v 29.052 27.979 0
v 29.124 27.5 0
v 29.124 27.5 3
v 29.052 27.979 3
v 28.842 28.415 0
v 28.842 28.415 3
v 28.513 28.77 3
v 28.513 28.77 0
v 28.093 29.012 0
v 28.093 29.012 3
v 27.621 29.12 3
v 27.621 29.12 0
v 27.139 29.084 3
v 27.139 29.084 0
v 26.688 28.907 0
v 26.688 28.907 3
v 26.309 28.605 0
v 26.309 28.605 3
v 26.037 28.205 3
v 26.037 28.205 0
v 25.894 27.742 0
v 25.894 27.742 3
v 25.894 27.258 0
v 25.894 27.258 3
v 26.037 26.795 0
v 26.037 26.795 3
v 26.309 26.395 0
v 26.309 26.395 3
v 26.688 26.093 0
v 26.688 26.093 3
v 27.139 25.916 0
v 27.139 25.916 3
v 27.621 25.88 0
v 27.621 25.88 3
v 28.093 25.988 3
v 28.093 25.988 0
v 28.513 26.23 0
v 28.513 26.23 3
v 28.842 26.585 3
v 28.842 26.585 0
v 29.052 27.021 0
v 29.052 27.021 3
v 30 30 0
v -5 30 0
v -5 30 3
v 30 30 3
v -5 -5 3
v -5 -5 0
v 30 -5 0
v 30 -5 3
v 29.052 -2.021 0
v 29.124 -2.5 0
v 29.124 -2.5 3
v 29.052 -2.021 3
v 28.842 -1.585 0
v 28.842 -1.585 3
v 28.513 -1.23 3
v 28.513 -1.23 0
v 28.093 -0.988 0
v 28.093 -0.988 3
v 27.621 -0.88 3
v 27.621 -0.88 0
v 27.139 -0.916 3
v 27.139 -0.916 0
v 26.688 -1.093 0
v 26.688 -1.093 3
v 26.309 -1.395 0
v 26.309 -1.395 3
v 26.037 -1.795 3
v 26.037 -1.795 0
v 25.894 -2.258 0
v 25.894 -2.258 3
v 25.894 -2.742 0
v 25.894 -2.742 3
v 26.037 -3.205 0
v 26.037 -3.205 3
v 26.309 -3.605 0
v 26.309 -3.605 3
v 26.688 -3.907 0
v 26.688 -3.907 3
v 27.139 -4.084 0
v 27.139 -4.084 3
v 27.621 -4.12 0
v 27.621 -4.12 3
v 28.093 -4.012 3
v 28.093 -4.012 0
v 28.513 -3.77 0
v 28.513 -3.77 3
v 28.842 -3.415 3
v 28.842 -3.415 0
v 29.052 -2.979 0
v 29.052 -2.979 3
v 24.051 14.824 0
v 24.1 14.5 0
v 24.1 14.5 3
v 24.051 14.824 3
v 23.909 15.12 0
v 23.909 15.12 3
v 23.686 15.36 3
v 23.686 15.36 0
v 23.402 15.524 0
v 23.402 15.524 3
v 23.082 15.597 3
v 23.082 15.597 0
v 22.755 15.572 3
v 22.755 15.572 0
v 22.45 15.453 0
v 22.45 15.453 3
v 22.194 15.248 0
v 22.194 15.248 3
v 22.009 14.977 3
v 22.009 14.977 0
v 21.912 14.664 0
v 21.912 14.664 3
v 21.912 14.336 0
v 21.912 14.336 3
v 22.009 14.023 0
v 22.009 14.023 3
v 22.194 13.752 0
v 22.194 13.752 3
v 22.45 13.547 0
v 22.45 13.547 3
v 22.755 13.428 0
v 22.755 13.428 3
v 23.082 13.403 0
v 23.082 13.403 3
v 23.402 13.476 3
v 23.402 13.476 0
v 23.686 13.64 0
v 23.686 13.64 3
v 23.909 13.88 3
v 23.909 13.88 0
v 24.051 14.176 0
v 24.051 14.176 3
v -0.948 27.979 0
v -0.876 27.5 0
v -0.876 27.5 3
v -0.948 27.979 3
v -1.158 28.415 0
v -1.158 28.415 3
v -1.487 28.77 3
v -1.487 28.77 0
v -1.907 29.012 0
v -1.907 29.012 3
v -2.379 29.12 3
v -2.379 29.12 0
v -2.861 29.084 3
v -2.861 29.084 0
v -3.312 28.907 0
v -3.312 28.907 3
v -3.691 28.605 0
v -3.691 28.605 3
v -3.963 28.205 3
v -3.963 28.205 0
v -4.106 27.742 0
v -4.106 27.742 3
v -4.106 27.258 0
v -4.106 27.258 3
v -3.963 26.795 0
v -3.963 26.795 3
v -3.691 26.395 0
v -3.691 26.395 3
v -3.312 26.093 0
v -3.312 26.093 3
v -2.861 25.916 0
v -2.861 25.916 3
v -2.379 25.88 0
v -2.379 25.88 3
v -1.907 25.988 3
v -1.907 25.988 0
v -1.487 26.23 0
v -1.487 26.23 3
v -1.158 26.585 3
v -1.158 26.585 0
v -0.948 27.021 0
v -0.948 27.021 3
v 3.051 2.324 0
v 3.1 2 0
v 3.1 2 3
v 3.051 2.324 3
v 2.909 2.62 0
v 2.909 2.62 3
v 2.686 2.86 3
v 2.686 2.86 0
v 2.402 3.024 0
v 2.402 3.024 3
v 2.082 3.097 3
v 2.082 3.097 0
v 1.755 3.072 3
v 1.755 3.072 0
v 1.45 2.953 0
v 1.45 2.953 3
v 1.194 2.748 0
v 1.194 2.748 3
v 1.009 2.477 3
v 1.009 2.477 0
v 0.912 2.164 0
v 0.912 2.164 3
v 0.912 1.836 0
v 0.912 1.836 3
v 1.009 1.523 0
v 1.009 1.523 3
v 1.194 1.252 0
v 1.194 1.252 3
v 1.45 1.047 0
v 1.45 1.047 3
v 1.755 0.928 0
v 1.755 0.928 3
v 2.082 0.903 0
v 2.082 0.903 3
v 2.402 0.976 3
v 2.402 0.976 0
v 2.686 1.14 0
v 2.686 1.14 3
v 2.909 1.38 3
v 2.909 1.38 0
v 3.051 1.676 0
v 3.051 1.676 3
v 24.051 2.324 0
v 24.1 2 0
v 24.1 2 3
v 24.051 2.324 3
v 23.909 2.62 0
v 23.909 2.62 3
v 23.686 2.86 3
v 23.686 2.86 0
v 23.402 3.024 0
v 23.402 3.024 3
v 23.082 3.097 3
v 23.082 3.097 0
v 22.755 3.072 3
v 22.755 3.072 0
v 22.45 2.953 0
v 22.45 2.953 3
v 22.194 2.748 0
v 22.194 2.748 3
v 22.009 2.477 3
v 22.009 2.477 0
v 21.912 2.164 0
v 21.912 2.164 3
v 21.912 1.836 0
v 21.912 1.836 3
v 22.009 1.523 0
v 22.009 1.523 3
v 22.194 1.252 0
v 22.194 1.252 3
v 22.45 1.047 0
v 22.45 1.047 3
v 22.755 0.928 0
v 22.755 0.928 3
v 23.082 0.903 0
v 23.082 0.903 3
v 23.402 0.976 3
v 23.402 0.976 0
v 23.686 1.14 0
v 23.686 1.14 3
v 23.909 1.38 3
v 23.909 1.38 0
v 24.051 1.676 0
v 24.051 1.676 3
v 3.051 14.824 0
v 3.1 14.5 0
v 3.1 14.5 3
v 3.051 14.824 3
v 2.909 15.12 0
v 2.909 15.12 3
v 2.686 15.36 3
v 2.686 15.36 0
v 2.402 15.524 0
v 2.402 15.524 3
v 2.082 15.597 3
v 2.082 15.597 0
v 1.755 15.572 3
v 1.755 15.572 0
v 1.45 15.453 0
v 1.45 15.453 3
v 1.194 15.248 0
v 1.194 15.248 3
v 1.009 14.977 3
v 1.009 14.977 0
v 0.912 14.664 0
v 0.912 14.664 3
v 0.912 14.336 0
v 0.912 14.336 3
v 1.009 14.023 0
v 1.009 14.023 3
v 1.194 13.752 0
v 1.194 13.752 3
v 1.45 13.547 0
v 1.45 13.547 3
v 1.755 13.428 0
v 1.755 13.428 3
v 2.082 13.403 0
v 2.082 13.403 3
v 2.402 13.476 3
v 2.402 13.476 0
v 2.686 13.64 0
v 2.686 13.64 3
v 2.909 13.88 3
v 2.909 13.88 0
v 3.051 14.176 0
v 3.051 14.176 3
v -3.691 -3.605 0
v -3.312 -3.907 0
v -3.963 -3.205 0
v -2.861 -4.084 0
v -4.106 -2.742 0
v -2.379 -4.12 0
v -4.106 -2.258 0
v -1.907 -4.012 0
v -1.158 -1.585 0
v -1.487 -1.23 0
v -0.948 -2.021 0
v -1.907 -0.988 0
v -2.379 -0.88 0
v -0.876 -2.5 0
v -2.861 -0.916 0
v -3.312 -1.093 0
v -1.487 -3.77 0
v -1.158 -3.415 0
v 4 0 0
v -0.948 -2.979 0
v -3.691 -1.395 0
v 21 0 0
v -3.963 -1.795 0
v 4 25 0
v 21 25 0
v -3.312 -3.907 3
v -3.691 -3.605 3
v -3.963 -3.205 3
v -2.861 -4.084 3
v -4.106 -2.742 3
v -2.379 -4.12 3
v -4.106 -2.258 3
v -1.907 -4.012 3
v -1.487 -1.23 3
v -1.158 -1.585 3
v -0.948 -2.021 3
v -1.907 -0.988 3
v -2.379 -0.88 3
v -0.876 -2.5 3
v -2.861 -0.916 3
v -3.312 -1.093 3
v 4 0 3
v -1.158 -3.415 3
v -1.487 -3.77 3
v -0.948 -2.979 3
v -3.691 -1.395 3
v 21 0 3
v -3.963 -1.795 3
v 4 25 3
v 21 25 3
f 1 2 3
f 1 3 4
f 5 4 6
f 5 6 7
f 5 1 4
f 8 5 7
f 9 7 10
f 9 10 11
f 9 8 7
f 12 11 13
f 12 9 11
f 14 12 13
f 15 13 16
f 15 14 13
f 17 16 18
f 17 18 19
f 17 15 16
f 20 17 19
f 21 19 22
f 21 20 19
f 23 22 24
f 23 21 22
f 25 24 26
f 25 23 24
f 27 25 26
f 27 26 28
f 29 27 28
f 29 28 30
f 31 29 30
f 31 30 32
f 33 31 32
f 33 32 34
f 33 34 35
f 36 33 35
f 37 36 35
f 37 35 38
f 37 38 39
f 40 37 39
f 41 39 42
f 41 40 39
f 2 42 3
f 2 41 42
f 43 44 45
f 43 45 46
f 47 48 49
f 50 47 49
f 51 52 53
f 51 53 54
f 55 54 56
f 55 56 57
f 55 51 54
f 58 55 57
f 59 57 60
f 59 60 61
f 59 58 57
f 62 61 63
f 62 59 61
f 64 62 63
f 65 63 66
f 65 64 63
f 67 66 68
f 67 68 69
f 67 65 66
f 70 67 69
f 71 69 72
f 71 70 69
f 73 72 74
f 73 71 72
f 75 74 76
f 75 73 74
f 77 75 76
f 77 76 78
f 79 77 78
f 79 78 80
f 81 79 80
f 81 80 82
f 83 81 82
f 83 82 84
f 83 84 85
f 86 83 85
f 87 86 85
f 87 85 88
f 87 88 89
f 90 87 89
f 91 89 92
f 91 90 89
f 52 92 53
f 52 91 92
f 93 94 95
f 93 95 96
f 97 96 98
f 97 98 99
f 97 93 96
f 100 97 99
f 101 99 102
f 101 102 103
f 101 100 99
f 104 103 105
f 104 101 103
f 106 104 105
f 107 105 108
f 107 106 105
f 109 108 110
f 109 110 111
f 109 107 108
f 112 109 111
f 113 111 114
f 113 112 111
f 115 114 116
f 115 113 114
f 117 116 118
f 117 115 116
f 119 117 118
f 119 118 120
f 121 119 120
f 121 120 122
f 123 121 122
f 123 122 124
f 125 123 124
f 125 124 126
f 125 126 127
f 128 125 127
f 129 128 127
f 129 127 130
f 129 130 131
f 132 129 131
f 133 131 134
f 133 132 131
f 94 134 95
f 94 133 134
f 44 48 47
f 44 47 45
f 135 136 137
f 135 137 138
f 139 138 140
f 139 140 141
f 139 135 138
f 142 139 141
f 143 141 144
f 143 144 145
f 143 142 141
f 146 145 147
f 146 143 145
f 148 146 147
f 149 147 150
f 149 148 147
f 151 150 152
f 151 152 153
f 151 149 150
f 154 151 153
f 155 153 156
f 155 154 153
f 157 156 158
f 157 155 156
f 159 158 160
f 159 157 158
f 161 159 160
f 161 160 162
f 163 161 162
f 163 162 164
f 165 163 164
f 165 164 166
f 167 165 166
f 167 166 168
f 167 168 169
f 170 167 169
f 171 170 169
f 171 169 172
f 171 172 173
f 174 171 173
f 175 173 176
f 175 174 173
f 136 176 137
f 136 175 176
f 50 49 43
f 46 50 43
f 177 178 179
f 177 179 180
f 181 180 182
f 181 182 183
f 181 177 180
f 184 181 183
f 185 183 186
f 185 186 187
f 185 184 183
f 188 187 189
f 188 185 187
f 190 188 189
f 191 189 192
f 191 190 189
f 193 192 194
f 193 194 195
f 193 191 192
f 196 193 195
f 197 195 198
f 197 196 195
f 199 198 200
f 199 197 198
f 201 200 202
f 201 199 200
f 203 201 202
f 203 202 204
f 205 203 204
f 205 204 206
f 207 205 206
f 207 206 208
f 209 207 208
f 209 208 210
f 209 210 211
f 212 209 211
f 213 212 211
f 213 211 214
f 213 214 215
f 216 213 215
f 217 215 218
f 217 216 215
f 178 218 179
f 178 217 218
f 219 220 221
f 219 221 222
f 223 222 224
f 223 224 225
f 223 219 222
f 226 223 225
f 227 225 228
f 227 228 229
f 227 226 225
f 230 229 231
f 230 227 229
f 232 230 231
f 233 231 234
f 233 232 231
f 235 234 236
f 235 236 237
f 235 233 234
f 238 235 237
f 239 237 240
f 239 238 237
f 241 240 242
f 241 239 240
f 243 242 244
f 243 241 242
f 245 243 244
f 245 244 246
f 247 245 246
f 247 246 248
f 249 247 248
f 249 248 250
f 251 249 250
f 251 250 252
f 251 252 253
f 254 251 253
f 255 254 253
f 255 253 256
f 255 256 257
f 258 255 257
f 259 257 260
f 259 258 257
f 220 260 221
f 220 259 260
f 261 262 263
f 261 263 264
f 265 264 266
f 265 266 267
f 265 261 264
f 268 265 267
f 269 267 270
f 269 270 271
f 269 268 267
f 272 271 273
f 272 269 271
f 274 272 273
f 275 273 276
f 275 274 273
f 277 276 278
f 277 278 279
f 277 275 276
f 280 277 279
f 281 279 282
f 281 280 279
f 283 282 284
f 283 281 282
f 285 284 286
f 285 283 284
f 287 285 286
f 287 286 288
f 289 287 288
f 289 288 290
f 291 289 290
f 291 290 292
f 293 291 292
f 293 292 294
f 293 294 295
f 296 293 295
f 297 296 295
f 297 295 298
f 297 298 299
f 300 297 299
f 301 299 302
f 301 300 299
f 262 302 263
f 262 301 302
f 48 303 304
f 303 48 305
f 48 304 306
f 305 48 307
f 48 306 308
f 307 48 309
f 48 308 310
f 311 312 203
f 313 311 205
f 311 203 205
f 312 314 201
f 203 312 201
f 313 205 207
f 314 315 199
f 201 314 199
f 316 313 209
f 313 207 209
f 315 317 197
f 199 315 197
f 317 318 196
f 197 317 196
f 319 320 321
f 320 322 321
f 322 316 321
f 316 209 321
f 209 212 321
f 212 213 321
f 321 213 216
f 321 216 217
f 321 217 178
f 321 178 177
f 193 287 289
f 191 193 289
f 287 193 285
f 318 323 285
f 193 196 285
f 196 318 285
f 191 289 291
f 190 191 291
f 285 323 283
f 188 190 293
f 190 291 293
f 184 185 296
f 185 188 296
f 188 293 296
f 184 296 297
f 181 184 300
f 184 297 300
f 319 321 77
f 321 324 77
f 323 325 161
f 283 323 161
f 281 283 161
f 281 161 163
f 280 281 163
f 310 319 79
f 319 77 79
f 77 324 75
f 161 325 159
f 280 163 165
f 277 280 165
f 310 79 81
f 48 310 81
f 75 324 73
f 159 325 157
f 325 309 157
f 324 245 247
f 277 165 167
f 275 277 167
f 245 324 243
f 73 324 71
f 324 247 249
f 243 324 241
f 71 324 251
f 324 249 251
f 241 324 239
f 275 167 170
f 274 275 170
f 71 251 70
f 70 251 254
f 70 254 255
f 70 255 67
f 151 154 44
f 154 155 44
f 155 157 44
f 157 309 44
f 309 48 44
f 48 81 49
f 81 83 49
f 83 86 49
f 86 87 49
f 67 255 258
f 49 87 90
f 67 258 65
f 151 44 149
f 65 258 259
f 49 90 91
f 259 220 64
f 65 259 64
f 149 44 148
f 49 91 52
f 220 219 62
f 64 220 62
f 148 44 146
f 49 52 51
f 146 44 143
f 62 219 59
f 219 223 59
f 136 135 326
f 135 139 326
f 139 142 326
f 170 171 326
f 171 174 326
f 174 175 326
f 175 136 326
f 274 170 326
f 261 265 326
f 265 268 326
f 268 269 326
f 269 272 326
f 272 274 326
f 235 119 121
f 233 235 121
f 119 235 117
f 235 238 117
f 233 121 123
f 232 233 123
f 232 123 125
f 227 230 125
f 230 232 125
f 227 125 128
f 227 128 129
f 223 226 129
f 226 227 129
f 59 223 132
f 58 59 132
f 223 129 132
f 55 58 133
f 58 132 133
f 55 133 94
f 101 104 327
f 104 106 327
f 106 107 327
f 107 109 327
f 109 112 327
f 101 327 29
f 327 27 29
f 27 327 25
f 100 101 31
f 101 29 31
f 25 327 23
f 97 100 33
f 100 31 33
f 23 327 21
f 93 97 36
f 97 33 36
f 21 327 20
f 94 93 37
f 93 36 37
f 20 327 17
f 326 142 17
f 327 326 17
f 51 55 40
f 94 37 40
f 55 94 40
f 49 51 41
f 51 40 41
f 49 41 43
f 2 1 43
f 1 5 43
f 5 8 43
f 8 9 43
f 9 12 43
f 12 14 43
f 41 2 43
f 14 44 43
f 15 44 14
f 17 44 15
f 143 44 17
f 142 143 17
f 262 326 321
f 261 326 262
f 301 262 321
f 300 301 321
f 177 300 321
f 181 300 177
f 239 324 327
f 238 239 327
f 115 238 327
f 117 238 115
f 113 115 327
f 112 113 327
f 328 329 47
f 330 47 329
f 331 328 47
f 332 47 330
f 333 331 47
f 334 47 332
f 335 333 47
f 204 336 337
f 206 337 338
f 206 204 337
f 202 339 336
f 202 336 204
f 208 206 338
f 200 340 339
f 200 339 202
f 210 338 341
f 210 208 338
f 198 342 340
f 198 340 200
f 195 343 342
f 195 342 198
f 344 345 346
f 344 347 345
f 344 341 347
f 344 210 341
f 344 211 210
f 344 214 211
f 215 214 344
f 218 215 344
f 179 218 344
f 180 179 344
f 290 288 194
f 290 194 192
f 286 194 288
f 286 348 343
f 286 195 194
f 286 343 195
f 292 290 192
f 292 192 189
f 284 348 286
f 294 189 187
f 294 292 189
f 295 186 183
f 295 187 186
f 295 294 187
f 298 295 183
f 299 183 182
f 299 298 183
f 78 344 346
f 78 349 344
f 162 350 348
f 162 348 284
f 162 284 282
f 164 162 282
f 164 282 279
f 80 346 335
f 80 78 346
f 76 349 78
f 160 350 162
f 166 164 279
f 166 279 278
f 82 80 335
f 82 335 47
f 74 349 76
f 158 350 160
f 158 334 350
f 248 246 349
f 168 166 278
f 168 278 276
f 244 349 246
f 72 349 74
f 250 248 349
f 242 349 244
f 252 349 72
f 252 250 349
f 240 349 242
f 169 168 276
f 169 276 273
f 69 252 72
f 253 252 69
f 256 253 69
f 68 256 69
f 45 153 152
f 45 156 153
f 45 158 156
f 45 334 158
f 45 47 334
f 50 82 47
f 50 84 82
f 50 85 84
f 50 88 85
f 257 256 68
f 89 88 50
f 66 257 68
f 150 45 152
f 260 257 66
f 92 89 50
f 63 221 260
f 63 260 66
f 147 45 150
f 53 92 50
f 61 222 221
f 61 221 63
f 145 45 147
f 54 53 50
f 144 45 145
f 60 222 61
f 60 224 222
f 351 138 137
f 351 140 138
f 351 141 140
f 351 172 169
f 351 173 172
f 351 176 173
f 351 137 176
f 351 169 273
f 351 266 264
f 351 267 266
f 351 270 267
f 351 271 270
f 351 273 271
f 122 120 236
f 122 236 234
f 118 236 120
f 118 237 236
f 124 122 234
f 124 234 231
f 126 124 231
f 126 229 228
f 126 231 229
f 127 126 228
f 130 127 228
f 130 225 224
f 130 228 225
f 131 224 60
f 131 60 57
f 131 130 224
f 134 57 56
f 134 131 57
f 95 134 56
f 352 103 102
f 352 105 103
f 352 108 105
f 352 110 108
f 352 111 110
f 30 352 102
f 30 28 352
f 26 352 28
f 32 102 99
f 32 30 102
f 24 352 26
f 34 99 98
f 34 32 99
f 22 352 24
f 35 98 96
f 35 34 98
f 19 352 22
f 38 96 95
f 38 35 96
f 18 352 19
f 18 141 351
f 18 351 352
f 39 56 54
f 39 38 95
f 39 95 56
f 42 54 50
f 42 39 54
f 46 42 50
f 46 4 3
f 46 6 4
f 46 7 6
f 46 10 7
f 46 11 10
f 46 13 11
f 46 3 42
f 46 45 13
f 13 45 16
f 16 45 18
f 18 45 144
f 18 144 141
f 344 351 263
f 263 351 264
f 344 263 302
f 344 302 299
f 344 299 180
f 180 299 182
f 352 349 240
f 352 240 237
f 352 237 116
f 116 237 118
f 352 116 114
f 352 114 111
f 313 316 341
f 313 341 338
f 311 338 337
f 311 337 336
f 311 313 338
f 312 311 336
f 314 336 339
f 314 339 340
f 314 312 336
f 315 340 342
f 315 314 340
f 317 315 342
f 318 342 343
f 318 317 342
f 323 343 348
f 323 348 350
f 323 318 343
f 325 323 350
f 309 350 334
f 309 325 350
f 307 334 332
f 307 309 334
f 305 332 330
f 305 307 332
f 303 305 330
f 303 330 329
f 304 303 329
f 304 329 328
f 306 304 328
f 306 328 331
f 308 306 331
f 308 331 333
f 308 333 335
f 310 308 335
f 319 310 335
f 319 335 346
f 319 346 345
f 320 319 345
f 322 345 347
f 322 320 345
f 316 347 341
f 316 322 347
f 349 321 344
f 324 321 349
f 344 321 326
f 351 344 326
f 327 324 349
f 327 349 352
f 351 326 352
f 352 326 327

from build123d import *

# Parameters (mm, degrees)
SKETCH1_W           = 35
SKETCH1_H           = 35
SKETCH1_W_2         = 17
SKETCH1_H_2         = 25
SKETCH1_R           = 1.1
SKETCH1_R_2         = 1.624281561
BOSS_EXTRUDE1_DEPTH = 3


with BuildPart() as part:
    # Sketch1 → Boss-Extrude1 (new body)
    with BuildSketch(Plane.XY):
        with Locations((12.5, 12.5)):
            Rectangle(SKETCH1_W, SKETCH1_H)
        with Locations((12.5, 12.5)):
            Rectangle(SKETCH1_W_2, SKETCH1_H_2, mode=Mode.SUBTRACT)
        with Locations((2, 2)):
            Circle(SKETCH1_R, mode=Mode.SUBTRACT)
        with Locations((2, 14.5)):
            Circle(SKETCH1_R, mode=Mode.SUBTRACT)
        with Locations((-2.5, -2.5)):
            Circle(SKETCH1_R_2, mode=Mode.SUBTRACT)
        with Locations((27.5, -2.5)):
            Circle(SKETCH1_R_2, mode=Mode.SUBTRACT)
        with Locations((-2.5, 27.5)):
            Circle(SKETCH1_R_2, mode=Mode.SUBTRACT)
        with Locations((27.5, 27.5)):
            Circle(SKETCH1_R_2, mode=Mode.SUBTRACT)
        with Locations((23, 14.5)):
            Circle(SKETCH1_R, mode=Mode.SUBTRACT)
        with Locations((23, 2)):
            Circle(SKETCH1_R, mode=Mode.SUBTRACT)
    extrude(amount=BOSS_EXTRUDE1_DEPTH)


solid = part.part
